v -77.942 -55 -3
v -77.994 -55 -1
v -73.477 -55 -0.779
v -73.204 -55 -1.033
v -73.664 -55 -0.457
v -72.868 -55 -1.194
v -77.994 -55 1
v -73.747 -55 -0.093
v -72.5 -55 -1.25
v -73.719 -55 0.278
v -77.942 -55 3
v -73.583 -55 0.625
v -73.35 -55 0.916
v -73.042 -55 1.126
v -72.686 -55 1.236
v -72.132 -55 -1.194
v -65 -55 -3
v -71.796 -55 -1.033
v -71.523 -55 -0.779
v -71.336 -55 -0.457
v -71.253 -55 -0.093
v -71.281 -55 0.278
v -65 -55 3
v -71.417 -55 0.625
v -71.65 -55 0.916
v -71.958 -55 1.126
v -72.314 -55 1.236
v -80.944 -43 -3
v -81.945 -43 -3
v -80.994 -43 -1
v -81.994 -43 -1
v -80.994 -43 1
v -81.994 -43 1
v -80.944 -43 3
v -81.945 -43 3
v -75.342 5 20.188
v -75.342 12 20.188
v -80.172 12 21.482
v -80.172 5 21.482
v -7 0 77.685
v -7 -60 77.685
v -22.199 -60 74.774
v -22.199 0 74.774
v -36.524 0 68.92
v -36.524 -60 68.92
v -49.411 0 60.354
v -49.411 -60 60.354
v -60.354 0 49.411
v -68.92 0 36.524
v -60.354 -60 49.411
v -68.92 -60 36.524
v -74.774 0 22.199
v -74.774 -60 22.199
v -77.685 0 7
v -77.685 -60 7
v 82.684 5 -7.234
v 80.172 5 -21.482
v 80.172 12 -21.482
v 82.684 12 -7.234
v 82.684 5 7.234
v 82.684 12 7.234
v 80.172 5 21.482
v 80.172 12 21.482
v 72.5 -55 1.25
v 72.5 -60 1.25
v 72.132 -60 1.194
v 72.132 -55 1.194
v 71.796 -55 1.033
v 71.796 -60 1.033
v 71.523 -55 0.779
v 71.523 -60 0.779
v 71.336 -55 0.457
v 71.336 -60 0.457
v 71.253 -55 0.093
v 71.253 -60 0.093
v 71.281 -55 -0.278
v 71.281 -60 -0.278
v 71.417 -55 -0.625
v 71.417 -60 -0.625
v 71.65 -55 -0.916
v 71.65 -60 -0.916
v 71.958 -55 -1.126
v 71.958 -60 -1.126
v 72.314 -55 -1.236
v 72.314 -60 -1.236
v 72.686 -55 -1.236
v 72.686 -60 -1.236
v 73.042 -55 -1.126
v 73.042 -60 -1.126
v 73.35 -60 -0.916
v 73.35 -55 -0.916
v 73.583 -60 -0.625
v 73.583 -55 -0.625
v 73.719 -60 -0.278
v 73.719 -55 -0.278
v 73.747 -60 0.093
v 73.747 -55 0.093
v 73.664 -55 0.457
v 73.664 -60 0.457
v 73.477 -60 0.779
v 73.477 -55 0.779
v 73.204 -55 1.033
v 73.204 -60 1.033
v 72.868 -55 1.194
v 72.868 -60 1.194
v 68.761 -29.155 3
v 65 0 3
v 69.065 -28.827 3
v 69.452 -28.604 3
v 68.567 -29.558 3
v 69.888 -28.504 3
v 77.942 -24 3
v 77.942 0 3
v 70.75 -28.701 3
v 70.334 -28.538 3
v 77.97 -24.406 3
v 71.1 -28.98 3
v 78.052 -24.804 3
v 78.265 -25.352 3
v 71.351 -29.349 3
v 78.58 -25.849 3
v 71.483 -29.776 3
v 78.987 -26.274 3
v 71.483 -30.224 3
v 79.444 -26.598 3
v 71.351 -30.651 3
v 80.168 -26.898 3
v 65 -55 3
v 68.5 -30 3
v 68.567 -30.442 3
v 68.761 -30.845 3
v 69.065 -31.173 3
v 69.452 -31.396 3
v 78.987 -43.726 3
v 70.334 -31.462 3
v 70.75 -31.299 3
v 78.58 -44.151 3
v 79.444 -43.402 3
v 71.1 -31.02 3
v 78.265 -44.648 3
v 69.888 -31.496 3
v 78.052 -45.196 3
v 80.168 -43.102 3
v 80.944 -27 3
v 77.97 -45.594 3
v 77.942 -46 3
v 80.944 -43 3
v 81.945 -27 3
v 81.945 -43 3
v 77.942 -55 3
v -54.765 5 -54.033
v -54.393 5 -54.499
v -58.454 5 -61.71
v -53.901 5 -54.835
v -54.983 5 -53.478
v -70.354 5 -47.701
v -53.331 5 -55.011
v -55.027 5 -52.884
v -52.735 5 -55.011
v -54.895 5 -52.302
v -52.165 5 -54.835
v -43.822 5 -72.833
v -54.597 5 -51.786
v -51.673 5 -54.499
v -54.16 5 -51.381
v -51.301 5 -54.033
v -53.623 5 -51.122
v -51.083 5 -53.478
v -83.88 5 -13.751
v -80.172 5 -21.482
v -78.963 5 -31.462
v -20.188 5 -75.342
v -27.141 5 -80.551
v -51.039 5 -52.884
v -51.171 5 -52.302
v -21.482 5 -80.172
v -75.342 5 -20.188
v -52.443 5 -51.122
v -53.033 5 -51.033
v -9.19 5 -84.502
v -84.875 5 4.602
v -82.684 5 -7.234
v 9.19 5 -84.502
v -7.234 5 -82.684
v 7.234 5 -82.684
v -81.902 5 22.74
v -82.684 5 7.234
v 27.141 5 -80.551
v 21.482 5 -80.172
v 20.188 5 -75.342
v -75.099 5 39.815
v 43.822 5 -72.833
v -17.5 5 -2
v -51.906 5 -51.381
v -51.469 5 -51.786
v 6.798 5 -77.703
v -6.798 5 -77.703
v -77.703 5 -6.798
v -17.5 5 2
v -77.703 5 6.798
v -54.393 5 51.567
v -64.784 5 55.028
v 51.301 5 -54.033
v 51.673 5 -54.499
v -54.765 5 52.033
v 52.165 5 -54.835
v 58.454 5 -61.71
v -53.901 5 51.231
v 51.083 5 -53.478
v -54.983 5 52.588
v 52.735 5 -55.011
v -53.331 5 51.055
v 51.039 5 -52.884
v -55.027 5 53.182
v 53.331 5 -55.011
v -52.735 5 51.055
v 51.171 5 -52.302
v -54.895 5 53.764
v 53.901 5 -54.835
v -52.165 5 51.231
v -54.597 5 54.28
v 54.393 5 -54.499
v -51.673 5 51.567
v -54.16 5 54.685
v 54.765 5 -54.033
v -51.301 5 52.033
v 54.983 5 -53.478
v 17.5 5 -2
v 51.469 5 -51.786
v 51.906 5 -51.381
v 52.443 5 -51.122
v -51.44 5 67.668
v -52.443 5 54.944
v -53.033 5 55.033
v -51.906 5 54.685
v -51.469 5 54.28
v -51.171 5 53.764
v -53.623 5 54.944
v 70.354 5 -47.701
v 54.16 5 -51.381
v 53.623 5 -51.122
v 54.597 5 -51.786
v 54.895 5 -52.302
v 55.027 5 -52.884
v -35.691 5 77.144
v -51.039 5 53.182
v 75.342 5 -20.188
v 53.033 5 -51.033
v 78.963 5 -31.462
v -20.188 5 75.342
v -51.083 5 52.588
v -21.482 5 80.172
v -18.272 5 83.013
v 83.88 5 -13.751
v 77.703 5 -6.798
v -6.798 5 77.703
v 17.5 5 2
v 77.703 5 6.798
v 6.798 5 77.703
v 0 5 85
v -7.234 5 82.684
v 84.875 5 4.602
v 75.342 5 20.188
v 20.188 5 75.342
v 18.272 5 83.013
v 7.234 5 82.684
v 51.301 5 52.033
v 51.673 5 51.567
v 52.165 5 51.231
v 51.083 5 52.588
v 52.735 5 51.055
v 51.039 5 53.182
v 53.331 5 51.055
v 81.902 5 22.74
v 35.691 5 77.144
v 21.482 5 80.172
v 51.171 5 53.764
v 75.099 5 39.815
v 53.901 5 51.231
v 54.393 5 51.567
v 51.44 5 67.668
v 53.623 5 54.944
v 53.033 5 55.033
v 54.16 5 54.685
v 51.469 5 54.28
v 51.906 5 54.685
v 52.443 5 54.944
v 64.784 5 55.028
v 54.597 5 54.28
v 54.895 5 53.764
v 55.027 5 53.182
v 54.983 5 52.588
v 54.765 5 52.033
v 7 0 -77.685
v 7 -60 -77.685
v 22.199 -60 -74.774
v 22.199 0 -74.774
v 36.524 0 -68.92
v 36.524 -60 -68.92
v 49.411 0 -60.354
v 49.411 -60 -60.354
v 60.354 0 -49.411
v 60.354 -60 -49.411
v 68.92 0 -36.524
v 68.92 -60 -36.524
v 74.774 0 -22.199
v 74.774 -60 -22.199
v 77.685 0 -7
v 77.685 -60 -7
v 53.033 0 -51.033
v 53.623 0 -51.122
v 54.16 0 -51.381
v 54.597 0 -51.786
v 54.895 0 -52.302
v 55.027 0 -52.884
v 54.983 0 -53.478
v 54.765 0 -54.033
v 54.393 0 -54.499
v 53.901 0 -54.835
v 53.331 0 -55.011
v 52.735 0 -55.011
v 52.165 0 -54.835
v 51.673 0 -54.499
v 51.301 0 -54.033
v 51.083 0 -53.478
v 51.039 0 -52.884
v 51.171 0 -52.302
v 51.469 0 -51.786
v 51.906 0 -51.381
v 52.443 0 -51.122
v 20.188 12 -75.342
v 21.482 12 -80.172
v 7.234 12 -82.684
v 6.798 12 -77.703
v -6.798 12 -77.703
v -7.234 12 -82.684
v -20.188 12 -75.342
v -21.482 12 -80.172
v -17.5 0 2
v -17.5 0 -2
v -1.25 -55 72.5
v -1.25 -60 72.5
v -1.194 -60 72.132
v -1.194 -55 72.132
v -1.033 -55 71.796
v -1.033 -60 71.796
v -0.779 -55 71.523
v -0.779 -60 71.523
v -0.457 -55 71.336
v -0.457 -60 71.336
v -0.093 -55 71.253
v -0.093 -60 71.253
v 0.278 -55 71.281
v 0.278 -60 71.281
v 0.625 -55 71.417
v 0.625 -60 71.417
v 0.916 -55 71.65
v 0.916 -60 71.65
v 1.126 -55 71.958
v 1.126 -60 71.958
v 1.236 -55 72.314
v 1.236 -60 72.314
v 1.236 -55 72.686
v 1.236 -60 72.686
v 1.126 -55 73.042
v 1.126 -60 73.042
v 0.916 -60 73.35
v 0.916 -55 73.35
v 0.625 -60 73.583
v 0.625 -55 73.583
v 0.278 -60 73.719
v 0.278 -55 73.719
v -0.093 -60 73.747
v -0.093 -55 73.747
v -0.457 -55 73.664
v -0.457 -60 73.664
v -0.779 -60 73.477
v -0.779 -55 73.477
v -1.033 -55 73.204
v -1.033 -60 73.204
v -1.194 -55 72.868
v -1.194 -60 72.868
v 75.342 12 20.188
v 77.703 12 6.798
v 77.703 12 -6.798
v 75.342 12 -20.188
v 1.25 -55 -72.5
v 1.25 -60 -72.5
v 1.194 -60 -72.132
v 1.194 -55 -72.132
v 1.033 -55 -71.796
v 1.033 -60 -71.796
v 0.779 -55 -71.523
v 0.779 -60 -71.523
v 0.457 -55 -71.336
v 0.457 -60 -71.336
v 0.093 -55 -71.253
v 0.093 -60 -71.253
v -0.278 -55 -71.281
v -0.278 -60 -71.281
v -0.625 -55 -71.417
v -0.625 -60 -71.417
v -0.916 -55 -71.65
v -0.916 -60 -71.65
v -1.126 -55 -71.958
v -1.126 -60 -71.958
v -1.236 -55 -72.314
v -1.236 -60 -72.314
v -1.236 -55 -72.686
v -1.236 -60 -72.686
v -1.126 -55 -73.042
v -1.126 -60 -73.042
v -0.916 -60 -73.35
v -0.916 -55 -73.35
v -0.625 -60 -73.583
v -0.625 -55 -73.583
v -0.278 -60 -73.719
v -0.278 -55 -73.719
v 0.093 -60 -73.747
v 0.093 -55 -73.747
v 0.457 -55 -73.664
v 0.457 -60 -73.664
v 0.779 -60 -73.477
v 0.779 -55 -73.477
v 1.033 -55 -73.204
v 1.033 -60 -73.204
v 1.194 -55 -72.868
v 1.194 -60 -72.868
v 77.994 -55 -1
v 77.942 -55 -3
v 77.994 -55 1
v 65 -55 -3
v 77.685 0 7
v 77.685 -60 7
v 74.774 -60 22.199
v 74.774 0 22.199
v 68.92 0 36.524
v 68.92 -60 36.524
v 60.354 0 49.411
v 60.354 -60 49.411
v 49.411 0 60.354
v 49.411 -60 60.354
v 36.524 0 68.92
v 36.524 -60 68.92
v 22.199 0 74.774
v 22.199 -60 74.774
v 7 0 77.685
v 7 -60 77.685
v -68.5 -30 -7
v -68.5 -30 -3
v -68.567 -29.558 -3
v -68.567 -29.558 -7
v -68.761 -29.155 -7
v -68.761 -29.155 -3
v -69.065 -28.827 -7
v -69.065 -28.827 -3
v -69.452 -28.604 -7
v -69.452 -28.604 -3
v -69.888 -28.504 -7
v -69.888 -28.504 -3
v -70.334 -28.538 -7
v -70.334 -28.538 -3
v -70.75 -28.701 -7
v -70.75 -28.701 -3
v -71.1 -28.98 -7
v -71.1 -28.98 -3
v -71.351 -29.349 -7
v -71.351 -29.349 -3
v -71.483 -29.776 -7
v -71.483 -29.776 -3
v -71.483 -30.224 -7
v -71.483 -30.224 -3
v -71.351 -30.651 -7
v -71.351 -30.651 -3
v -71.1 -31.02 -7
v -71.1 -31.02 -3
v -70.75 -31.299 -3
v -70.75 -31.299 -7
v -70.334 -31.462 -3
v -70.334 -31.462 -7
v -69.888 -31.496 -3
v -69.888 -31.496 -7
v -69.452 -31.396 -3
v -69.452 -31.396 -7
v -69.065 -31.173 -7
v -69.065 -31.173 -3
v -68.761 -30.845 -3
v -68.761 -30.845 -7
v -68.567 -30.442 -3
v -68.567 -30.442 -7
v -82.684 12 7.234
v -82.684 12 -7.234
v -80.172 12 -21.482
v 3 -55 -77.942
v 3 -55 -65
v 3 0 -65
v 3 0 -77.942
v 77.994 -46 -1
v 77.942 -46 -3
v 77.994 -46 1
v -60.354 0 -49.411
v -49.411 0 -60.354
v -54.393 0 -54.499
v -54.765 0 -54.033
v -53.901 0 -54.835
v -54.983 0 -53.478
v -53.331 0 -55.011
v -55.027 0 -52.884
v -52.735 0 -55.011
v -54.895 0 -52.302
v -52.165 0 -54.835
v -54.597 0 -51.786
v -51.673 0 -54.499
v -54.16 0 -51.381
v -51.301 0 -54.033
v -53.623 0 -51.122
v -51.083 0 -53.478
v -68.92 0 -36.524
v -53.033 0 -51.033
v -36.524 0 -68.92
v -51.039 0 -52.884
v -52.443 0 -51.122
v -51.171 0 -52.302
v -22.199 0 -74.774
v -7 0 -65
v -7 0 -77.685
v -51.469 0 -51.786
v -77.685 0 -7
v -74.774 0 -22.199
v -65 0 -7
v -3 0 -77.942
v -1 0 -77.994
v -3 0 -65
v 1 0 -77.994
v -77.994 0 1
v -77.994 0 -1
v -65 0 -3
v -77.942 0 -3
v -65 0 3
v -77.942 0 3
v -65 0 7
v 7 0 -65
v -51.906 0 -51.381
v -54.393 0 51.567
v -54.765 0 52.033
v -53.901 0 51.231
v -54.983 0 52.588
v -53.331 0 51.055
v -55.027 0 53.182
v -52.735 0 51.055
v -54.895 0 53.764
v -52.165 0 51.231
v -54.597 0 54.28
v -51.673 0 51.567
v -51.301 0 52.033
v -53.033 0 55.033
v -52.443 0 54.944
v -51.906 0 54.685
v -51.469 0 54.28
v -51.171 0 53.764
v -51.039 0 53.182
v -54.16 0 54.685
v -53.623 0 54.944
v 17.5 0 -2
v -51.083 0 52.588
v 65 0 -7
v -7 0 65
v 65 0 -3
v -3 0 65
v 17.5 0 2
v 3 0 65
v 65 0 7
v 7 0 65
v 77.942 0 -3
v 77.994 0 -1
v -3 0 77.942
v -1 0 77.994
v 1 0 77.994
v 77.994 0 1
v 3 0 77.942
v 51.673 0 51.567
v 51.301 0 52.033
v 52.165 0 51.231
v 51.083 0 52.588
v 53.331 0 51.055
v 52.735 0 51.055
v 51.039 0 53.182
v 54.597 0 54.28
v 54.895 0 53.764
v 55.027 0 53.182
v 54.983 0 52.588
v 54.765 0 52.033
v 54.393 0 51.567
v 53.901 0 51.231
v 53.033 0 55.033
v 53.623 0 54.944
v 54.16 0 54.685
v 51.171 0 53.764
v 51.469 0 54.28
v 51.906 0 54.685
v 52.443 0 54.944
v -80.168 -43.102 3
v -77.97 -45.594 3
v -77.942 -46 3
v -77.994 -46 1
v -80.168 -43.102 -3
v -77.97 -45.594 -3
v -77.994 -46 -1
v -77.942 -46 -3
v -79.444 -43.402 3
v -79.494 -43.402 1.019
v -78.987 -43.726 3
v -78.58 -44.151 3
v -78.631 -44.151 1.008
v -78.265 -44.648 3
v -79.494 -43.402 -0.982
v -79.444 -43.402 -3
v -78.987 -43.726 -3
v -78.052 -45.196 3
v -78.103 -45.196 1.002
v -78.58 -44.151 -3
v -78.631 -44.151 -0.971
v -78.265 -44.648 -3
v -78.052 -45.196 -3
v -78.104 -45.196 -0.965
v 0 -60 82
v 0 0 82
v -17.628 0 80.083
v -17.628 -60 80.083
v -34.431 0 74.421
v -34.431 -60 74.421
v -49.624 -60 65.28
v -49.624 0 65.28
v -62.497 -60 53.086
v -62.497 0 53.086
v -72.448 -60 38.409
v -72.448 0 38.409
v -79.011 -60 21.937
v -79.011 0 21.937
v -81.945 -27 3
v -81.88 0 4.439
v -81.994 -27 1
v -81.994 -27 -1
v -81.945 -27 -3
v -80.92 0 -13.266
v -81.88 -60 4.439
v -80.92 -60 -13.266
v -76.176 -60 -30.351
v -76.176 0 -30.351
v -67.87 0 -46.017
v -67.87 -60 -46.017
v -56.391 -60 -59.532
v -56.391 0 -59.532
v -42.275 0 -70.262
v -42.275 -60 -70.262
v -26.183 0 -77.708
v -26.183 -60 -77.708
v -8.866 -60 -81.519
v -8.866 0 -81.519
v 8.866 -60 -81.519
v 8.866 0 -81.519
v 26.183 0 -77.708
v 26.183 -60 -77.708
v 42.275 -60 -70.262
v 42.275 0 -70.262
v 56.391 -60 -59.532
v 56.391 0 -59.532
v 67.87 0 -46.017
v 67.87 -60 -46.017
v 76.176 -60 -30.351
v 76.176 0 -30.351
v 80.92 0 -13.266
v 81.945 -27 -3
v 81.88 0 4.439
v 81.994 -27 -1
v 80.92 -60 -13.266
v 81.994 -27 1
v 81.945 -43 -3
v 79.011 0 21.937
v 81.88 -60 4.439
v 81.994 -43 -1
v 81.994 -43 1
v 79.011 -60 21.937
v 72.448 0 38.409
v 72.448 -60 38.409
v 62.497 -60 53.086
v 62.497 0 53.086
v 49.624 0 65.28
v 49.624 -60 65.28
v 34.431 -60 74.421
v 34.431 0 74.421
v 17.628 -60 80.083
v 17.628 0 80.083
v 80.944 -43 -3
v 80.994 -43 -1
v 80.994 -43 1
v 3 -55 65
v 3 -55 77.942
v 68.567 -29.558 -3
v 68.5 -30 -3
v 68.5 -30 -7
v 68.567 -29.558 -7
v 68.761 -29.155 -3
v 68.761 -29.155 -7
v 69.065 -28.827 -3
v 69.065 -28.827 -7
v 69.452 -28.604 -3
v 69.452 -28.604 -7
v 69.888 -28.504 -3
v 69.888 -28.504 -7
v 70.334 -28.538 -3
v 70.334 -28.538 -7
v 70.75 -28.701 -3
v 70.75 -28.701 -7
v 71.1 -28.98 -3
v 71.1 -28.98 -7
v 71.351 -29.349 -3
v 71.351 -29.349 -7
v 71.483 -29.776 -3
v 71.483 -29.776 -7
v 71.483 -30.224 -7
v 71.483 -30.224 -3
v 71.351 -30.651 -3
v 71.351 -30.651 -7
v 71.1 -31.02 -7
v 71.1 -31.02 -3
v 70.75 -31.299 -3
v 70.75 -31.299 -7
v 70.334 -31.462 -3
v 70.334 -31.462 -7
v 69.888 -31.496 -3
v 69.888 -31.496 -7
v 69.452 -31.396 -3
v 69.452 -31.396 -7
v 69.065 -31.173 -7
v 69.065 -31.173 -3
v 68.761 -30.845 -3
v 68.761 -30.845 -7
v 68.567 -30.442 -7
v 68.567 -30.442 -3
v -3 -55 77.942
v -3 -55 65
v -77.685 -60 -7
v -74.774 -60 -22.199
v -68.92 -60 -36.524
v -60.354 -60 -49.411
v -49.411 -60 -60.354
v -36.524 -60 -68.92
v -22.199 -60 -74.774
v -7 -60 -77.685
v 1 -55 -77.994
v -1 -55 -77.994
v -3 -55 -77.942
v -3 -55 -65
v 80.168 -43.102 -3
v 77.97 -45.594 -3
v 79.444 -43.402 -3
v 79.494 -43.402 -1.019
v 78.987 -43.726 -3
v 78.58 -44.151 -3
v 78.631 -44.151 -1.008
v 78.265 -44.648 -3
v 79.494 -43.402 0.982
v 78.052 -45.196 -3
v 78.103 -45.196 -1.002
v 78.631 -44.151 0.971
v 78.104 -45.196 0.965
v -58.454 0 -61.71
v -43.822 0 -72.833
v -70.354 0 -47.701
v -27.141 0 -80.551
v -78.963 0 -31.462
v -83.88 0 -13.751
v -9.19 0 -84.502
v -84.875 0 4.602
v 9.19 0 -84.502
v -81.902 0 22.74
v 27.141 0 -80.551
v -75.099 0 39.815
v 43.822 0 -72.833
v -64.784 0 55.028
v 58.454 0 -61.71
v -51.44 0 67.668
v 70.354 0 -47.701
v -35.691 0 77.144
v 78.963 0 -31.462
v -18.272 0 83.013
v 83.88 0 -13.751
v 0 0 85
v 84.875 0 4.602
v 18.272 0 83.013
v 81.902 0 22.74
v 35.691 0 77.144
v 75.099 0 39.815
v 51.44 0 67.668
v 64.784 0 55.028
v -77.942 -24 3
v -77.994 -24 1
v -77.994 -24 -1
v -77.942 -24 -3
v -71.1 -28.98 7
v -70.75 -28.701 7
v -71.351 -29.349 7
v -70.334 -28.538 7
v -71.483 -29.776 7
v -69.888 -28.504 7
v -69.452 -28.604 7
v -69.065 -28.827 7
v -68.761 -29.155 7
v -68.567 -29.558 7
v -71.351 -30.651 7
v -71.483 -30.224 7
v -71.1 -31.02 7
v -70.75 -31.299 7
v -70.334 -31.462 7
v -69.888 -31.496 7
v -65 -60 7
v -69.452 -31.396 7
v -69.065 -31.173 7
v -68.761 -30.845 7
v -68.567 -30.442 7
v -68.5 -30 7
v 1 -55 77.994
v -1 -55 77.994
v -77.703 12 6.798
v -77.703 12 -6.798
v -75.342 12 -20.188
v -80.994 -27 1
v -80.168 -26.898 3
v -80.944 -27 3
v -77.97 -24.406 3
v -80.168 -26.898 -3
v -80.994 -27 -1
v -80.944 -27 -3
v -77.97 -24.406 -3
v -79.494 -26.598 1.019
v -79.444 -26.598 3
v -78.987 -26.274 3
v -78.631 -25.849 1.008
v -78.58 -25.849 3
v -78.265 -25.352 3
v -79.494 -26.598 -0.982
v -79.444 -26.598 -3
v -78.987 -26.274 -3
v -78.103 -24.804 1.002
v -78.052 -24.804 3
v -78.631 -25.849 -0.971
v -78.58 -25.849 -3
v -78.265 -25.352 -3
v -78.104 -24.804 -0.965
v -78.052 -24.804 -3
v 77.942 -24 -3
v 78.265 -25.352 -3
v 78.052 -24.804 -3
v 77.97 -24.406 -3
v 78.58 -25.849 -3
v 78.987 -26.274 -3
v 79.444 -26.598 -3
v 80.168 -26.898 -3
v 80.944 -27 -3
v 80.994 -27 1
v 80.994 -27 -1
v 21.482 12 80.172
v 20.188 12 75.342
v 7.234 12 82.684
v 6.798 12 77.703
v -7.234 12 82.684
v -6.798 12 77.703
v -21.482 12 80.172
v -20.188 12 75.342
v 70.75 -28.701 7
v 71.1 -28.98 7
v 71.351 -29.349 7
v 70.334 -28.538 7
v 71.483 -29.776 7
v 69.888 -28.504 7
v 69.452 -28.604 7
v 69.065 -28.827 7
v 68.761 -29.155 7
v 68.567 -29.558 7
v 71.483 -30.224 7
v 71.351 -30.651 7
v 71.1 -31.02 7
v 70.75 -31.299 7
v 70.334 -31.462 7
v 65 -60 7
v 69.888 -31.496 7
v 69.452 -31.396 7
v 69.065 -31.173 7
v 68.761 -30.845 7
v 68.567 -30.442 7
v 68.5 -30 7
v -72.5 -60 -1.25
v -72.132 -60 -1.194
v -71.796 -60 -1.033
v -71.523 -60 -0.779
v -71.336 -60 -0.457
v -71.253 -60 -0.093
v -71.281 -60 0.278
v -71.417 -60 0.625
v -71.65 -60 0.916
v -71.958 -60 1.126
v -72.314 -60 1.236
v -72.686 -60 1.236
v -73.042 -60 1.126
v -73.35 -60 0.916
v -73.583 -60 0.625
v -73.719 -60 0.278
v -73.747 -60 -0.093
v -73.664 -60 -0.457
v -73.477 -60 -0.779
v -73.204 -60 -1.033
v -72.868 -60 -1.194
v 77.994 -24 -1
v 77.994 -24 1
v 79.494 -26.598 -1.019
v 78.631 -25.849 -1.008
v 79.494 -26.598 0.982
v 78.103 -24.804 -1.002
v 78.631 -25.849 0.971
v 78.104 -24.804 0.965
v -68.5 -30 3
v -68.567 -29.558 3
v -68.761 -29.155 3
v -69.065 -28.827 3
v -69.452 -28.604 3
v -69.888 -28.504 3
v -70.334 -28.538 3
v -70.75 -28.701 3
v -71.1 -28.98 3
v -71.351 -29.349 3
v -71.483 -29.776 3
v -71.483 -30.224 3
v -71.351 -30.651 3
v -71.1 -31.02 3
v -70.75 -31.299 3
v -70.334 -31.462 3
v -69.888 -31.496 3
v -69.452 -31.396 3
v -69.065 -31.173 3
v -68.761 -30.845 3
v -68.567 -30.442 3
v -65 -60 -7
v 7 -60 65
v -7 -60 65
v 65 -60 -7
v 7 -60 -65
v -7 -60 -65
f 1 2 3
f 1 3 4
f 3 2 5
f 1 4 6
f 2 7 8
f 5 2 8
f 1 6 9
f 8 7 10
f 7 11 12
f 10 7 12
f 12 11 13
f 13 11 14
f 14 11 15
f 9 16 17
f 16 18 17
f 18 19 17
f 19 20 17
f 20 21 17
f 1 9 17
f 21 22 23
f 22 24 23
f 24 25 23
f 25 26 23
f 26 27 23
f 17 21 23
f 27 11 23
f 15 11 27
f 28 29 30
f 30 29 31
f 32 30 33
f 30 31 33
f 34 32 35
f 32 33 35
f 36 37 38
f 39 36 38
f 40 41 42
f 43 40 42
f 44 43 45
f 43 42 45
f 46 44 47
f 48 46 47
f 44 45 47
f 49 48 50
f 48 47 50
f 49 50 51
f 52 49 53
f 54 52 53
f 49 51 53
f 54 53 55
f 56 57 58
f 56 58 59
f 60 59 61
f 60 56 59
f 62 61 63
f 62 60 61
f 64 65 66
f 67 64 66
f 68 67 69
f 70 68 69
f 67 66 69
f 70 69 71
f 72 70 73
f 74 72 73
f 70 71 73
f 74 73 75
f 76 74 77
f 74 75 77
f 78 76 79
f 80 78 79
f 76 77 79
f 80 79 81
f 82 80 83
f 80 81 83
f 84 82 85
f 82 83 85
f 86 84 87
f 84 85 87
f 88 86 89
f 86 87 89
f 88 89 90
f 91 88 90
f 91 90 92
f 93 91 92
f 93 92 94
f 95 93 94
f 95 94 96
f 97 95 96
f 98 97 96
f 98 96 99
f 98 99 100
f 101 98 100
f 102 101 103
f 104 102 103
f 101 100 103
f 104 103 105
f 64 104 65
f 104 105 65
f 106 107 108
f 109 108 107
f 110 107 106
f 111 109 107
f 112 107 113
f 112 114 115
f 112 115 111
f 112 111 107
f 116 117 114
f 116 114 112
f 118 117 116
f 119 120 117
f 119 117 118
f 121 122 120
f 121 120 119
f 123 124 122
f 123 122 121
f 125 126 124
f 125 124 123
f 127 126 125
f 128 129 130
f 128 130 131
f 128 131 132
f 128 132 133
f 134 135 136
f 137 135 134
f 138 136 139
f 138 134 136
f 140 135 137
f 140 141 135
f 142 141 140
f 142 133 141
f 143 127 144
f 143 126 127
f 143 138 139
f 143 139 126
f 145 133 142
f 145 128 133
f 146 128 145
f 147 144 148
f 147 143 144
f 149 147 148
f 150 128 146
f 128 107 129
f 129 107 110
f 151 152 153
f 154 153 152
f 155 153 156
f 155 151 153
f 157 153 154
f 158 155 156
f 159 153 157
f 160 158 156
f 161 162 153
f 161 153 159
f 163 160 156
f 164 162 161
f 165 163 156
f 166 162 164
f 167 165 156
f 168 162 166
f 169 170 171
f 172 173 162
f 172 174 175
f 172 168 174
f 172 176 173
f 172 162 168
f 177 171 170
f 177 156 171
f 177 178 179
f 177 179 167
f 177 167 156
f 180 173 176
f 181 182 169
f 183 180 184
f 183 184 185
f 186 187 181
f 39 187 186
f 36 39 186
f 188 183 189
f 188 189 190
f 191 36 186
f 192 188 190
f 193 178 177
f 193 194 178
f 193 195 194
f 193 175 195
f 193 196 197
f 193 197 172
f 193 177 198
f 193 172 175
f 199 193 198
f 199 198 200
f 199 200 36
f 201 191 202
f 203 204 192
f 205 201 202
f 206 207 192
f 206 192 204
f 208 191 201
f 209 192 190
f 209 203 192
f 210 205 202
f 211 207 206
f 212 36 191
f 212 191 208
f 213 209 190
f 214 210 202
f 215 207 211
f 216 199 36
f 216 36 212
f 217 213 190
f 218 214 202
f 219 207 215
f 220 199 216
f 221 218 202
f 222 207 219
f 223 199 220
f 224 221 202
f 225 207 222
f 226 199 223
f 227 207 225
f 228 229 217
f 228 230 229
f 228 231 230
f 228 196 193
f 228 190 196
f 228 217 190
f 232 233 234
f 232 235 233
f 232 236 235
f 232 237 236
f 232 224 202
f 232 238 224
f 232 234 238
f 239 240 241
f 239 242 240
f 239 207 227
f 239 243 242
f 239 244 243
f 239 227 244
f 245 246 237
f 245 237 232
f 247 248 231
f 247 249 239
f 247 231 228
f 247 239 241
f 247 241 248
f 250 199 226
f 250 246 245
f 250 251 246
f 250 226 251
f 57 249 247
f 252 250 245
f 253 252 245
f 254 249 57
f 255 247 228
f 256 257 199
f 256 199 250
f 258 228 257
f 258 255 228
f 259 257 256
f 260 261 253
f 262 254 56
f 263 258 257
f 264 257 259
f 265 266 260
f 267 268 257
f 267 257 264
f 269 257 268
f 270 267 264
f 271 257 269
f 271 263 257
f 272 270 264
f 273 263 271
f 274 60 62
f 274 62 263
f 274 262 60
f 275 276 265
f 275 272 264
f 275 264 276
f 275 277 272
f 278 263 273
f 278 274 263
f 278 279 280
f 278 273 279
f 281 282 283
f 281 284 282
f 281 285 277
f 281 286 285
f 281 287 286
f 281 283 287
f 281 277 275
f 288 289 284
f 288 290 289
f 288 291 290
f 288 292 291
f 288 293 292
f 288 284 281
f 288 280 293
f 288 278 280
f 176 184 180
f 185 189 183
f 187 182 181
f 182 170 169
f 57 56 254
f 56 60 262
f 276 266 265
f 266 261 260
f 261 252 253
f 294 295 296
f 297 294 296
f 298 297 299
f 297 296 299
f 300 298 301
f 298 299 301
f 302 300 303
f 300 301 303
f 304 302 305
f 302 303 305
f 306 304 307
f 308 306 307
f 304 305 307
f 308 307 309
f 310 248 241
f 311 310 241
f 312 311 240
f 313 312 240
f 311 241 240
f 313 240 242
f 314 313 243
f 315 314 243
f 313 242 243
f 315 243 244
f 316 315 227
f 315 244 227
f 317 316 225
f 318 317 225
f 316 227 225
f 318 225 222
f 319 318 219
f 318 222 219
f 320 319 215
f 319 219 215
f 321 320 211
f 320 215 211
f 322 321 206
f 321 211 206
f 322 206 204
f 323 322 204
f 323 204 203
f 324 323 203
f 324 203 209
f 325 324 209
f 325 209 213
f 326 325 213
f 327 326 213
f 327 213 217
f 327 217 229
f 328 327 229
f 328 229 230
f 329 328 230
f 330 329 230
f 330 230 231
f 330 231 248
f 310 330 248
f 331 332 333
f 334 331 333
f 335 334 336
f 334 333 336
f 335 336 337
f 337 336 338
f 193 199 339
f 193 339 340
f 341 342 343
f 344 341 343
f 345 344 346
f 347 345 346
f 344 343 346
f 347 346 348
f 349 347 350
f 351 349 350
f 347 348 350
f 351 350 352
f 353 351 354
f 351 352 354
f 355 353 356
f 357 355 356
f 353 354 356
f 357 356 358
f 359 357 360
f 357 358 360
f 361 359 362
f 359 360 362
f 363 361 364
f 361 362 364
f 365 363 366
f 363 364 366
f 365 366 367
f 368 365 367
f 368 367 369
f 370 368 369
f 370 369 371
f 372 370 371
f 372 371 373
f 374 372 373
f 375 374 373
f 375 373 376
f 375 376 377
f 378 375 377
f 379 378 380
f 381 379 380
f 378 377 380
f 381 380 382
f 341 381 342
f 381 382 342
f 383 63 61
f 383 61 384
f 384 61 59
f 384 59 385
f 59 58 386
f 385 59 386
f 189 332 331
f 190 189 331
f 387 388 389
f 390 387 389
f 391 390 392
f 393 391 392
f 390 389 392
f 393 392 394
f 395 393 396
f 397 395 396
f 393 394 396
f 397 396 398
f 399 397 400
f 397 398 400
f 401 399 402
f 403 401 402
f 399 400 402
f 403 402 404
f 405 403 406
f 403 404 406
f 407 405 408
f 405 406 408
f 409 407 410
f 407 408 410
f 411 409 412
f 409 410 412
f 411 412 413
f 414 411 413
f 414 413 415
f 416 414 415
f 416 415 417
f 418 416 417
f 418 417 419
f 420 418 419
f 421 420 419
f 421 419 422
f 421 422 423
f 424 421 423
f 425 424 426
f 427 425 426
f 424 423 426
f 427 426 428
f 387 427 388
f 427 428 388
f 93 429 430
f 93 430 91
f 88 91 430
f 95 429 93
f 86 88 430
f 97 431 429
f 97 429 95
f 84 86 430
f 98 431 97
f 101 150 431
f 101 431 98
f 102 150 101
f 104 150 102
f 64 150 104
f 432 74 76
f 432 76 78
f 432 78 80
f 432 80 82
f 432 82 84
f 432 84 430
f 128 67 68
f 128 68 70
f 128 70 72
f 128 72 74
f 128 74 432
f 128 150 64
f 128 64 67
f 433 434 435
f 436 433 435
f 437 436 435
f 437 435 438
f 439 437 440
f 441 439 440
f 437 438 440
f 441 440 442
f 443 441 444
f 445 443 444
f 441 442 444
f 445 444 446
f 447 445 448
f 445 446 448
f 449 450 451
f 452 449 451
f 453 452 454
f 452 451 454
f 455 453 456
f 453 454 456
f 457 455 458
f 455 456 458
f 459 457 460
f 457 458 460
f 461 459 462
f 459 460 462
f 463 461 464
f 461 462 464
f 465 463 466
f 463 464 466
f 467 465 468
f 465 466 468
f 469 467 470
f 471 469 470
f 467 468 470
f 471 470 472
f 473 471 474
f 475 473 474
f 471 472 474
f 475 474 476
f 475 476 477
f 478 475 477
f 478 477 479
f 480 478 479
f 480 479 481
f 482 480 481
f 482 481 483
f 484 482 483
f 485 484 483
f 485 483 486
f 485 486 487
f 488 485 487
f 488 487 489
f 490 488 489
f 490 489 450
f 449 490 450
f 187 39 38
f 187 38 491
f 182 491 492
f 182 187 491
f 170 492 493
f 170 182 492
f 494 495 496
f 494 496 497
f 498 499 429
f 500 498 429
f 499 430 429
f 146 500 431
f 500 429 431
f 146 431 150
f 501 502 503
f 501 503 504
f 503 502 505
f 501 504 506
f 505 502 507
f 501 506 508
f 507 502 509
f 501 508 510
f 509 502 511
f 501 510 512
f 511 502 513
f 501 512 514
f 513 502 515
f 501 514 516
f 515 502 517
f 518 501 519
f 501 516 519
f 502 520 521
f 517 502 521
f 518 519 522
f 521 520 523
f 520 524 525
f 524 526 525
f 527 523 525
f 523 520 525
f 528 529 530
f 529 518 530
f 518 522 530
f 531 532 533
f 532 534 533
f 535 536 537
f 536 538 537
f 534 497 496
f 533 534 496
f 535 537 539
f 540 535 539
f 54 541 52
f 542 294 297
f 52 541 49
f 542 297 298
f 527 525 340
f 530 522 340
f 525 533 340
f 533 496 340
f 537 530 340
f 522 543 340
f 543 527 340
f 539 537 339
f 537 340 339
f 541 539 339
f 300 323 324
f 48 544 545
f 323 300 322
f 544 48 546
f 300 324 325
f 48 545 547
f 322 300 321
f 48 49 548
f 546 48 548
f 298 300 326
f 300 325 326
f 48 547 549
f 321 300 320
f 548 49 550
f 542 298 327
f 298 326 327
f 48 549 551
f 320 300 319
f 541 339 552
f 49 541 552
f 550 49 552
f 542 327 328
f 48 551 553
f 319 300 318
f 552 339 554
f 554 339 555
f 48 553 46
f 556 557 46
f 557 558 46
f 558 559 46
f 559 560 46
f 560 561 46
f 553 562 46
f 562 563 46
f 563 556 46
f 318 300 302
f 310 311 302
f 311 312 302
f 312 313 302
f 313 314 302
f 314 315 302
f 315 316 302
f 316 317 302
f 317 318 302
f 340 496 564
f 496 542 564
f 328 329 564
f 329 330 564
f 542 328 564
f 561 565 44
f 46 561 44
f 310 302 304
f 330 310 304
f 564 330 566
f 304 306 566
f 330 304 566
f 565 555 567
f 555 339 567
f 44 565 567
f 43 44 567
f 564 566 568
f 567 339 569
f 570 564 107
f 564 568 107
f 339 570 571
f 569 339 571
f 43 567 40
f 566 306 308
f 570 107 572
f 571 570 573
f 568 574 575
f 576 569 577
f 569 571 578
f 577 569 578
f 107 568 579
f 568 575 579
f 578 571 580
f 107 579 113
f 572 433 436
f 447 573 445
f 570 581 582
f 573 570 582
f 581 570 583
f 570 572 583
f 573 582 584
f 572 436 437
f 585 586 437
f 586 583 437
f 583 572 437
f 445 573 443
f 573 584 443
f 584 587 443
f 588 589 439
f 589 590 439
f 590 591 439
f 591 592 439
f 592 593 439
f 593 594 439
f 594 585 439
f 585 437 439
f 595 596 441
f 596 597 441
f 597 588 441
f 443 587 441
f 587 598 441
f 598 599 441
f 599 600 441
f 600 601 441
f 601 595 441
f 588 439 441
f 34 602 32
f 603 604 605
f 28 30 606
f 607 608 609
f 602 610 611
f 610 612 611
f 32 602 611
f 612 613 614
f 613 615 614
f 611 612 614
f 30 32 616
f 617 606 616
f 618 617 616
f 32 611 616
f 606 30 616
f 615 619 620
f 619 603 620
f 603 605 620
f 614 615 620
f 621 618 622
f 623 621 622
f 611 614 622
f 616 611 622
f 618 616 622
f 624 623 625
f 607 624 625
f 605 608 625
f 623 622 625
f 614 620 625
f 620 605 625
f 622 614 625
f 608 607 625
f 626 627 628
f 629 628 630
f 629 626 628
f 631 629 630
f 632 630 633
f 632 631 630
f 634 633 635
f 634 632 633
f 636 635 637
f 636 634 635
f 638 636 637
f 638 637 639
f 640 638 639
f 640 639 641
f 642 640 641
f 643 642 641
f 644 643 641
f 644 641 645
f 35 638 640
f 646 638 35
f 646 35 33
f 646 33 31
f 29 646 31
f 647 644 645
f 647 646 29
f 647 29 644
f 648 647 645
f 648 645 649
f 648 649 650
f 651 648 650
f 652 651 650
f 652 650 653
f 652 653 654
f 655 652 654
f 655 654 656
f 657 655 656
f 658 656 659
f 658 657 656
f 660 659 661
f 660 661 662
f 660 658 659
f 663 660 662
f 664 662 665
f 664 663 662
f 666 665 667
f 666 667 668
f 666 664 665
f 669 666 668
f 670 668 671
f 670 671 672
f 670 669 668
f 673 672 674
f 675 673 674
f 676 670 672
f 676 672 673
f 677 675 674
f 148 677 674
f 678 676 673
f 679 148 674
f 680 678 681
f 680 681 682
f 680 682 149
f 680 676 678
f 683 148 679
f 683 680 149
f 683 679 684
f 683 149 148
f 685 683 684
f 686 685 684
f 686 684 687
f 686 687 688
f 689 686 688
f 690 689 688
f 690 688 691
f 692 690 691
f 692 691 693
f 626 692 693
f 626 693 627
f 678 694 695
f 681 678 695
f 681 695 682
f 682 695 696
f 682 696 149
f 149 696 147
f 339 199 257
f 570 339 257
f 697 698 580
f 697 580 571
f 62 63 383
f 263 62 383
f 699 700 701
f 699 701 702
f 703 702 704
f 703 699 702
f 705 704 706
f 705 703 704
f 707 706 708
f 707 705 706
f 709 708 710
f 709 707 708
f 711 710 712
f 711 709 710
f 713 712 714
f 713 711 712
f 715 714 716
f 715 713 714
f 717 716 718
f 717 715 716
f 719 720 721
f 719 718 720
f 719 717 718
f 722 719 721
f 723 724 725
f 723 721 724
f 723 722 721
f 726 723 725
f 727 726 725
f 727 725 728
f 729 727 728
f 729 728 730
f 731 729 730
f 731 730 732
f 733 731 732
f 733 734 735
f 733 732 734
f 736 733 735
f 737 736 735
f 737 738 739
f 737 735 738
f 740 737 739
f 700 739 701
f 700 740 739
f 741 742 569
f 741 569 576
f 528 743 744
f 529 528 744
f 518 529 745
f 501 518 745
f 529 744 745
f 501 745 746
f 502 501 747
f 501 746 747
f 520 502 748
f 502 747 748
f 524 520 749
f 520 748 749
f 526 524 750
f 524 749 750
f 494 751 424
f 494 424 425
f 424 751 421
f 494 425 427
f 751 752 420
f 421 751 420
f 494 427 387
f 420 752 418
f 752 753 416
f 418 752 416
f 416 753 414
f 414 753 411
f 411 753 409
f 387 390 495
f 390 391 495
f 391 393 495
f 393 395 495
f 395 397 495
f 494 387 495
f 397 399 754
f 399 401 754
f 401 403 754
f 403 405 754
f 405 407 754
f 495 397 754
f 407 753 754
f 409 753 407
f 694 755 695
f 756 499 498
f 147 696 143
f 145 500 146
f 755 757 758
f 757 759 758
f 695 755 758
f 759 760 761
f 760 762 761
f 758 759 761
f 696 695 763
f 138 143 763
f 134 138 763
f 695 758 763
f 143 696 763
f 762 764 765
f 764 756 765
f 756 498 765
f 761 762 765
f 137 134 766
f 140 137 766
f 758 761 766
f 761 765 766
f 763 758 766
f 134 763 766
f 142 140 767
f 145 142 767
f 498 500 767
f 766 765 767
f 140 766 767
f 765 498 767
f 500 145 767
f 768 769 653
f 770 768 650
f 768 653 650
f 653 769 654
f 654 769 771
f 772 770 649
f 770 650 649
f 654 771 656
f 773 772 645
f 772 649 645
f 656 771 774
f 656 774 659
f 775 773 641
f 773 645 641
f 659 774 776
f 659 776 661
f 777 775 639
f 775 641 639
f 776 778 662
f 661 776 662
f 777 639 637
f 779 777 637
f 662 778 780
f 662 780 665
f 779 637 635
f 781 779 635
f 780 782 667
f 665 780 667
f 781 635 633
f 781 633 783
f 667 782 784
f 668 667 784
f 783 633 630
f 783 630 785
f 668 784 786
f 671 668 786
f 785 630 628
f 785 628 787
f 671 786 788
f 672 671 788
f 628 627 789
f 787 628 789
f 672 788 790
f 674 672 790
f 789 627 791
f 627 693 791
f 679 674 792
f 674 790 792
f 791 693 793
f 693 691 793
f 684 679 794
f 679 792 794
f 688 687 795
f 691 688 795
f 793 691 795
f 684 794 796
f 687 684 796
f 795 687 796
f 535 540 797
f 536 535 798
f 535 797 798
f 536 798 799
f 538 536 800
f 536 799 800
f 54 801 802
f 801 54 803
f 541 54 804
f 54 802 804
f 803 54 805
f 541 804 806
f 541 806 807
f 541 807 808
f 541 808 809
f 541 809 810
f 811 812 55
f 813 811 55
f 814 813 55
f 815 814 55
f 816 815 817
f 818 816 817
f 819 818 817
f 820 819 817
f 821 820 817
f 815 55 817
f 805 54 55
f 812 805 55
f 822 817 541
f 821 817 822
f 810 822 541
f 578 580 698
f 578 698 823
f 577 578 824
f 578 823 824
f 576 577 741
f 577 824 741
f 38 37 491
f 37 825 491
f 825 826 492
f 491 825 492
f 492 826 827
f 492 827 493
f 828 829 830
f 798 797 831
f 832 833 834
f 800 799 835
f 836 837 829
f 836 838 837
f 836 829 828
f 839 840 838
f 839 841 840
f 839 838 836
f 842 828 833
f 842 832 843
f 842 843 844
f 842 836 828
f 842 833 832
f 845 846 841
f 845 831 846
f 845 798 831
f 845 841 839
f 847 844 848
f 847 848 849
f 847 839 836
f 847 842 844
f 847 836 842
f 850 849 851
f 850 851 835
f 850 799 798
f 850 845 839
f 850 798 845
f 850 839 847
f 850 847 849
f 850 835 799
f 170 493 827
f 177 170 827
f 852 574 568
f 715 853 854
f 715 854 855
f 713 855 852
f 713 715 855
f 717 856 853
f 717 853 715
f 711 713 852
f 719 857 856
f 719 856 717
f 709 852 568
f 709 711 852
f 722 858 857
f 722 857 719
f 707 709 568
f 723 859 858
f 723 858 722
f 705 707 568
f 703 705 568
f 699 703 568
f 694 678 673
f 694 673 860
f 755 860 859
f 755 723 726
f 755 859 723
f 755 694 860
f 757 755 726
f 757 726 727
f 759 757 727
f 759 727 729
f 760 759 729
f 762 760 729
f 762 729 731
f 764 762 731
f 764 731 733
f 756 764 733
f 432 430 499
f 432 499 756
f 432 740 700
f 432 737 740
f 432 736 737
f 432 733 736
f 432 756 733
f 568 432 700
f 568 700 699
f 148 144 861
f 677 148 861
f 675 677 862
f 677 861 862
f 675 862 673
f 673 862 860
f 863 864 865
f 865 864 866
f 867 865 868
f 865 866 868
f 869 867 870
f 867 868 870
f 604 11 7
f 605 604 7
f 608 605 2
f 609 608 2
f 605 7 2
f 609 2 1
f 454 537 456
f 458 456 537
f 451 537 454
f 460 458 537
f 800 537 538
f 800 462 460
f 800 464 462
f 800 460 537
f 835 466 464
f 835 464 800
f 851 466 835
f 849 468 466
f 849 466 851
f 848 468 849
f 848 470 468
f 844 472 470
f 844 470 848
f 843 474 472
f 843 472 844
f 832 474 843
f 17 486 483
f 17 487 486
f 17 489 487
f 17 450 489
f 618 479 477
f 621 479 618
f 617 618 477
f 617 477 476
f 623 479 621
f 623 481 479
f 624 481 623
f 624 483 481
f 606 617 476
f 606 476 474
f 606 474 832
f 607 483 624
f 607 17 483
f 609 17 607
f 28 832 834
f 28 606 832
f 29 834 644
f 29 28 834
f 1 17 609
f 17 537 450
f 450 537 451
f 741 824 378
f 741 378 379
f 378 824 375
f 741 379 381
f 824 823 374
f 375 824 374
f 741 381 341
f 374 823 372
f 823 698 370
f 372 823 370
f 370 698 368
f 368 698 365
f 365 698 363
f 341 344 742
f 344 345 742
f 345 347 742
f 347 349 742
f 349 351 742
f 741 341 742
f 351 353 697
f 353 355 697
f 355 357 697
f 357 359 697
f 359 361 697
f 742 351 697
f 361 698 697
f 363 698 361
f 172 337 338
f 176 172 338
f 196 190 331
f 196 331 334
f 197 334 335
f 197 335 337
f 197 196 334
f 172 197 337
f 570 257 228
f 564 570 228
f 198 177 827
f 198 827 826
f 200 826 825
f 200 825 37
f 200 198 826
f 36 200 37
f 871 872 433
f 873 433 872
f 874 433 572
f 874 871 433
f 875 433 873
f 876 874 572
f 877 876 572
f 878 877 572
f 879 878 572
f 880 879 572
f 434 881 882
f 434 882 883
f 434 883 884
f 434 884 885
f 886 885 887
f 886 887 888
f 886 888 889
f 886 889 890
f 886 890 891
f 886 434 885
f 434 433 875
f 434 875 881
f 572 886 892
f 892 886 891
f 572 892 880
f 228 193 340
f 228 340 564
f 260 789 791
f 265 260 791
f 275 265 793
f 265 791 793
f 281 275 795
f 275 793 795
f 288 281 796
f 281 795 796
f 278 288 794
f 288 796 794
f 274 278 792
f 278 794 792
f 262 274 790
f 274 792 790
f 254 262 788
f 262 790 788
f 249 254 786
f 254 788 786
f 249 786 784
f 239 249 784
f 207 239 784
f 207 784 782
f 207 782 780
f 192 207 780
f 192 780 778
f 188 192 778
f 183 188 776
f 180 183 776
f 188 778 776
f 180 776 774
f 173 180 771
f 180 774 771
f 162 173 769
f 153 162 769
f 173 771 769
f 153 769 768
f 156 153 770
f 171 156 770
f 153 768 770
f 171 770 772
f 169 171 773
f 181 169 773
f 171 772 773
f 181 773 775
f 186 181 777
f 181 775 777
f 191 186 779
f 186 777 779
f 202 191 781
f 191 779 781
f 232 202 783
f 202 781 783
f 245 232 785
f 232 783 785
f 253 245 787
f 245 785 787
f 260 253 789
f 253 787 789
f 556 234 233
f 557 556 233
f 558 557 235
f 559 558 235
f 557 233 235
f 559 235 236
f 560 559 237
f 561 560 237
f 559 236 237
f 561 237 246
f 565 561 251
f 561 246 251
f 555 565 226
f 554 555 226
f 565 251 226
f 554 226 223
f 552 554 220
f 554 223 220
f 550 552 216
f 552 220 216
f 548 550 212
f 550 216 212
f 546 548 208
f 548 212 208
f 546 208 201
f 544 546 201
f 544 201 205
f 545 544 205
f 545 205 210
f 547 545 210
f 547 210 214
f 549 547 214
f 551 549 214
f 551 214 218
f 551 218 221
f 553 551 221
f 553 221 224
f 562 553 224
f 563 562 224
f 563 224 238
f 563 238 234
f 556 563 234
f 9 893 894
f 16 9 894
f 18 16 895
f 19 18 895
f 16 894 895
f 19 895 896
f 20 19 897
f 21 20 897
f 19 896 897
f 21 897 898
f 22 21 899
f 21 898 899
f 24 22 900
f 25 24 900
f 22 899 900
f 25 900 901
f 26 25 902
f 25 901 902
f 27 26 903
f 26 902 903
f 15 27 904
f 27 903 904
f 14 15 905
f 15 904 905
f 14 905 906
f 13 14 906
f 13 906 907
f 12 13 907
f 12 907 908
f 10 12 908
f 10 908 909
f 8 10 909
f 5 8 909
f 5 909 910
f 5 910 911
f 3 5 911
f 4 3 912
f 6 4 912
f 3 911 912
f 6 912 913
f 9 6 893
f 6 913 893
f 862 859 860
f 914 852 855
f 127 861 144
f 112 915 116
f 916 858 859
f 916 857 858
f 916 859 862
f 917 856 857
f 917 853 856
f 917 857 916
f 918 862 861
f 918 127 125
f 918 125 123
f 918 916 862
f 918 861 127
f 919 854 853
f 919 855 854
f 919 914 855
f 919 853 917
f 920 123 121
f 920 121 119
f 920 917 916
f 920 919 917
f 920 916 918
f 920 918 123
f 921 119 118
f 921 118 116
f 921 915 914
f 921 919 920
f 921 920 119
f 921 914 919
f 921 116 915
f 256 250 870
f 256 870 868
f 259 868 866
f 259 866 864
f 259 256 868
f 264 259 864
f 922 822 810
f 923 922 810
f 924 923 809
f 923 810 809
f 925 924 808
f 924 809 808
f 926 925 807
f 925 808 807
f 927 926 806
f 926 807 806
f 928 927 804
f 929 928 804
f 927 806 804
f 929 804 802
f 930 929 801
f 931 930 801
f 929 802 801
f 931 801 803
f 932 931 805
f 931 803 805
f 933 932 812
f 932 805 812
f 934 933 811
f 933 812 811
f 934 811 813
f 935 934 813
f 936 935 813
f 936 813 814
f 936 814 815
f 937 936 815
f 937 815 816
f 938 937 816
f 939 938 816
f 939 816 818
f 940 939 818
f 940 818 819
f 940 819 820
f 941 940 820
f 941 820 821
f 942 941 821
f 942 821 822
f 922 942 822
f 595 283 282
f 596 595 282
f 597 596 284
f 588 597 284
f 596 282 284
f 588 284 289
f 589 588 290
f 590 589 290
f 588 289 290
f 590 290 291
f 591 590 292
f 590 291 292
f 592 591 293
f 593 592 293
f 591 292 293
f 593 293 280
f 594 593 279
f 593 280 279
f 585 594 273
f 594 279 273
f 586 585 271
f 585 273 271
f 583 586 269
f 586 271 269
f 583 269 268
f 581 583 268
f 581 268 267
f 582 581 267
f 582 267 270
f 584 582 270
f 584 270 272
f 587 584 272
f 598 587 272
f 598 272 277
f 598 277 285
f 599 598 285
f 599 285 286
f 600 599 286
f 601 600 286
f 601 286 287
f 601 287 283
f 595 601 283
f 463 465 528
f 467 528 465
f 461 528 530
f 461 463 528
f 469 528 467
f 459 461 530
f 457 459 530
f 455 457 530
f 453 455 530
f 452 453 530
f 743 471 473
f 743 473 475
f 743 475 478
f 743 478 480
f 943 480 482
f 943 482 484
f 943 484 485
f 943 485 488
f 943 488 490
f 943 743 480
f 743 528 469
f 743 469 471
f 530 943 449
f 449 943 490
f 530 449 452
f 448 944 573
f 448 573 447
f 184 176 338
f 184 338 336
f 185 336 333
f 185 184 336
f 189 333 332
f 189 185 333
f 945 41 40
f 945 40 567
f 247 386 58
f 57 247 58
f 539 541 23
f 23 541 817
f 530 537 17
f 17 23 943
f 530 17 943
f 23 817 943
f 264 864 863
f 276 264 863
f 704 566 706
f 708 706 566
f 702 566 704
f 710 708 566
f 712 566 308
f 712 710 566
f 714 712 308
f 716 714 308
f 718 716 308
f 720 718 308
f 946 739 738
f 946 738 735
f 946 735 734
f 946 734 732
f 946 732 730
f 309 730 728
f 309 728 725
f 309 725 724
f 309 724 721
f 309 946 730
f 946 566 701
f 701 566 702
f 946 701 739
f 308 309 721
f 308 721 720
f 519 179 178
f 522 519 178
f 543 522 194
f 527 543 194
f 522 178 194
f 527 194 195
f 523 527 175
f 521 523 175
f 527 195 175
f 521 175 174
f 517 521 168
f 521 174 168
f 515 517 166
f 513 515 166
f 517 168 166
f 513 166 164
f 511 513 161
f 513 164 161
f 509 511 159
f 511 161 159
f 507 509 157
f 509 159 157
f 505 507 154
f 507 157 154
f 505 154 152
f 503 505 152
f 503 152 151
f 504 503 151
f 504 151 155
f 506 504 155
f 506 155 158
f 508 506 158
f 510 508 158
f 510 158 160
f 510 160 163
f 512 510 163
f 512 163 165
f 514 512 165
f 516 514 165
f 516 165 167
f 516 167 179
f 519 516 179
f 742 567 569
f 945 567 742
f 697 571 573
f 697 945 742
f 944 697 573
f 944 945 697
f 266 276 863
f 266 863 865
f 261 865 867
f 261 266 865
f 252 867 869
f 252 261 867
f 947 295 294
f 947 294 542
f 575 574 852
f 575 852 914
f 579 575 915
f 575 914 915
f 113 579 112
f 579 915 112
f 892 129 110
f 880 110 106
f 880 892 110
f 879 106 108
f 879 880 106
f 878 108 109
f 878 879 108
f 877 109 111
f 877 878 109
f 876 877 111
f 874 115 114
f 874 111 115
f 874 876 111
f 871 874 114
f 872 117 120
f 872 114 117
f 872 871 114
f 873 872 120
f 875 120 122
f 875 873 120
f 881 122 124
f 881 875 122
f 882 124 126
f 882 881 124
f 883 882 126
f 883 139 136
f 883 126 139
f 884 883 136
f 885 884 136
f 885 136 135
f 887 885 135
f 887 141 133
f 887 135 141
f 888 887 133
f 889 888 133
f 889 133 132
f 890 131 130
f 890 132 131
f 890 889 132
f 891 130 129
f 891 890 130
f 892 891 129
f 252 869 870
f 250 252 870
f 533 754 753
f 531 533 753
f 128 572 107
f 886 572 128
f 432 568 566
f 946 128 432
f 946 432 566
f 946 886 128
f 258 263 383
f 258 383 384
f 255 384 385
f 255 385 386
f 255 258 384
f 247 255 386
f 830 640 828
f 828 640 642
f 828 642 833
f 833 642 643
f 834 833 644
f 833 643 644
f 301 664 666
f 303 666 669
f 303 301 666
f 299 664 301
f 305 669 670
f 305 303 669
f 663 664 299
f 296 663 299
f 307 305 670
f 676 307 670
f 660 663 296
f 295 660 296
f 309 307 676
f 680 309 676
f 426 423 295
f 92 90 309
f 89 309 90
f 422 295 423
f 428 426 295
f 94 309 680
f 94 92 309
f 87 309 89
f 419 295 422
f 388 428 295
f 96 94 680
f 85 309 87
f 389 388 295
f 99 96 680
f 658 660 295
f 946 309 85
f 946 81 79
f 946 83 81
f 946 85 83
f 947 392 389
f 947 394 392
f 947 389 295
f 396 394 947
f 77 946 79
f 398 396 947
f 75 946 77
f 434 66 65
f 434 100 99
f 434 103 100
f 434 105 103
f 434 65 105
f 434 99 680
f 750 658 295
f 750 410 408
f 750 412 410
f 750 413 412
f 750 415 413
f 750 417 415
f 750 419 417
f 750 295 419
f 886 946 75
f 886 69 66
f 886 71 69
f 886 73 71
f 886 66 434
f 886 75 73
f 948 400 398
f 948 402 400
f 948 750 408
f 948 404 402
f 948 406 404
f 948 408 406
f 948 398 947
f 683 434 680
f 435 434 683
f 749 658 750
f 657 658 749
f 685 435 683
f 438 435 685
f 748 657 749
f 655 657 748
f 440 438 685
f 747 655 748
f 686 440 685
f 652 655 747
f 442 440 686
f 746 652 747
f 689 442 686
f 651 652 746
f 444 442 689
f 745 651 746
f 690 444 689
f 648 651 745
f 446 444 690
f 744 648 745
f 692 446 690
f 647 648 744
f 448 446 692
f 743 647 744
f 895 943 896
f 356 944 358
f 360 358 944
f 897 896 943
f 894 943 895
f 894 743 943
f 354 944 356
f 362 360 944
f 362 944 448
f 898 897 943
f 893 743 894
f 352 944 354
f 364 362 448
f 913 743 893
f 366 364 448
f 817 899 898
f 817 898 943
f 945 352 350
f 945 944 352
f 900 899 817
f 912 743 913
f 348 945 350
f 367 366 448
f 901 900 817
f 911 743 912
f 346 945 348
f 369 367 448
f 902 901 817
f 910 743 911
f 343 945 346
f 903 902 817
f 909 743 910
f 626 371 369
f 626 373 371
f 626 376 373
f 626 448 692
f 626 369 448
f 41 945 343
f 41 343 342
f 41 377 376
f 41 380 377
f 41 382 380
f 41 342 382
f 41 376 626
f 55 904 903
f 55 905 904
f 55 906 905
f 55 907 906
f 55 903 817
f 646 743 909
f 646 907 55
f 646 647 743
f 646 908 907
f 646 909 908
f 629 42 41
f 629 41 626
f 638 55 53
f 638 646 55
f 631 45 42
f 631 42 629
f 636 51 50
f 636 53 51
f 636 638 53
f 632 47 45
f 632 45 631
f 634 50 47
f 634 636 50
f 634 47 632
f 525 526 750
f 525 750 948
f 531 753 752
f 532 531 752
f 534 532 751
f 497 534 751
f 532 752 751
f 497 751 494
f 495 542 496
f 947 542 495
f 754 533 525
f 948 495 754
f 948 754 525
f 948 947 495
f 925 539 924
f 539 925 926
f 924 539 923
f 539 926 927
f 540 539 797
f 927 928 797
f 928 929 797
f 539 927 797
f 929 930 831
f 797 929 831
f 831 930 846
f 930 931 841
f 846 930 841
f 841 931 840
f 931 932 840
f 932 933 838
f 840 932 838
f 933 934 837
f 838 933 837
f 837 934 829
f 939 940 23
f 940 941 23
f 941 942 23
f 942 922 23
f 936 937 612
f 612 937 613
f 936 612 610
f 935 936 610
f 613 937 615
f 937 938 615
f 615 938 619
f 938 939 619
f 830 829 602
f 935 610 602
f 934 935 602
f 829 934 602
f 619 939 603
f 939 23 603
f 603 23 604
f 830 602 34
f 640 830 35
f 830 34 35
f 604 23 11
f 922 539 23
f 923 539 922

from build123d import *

# Parameters (mm, degrees)
SKETCH1_R                   = 85
BOSS_EXTRUDE1_DEPTH         = 5
SKETCH14_R                  = 2
CUT_EXTRUDE2_DEPTH          = 133
SKETCH16_W                  = 35
SKETCH16_H                  = 4
CUT_EXTRUDE4_DEPTH          = 10
BOSS_EXTRUDE2_DEPTH         = 7
BOSS_EXTRUDE3_START         = 60
SKETCH20_R                  = 82
SKETCH20_R_2                = 78
BOSS_EXTRUDE3_DEPTH         = 60
BOSS_EXTRUDE4_START         = 60
BOSS_EXTRUDE4_DEPTH         = 60
SKETCH23_R                  = 1.5
CUT_EXTRUDE5_DEPTH          = 25
CUT_EXTRUDE6_DEPTH          = 110
CUT_EXTRUDE6_DEPTH_BACK     = 105
FILLET1_R                   = 3
SKETCH27_W                  = 14
SKETCH27_H                  = 14
BOSS_EXTRUDE5_DEPTH         = 5
CIRPATTERN1_COUNT           = 2
CIRPATTERN1_ANGLE           = 90
CIRPATTERN1_COPY_1_SKETCH_W = 14
CIRPATTERN1_COPY_1_SKETCH_H = 14
CIRPATTERN1_COPY_1_DEPTH    = 5
SKETCH29_R                  = 1.25
CUT_EXTRUDE7_DEPTH          = 5
CIRPATTERN2_COUNT           = 4


with BuildPart() as part:
    # Sketch1 → Boss-Extrude1 (new body)
    with BuildSketch(Plane(origin=(0, 0, 0), x_dir=(1, 0, 0), z_dir=(0, 1, 0))):
        with Locations(Location((0, 0, 0), (0, 0, 270))):
            Circle(SKETCH1_R)
    extrude(amount=BOSS_EXTRUDE1_DEPTH)

    # Sketch14 → Cut-Extrude2 (cut)
    with BuildSketch(Plane(origin=(0, 5, 0), x_dir=(1, 0, 0), z_dir=(0, 1, 0))):
        with Locations(Location((-53.033008589, 53.033008589, 0), (0, 0, 270))):
            Circle(SKETCH14_R)
        with Locations(Location((53.033008589, 53.033008589, 0), (0, 0, 270))):
            Circle(SKETCH14_R)
        with Locations(Location((53.033008589, -53.033008589, 0), (0, 0, 270))):
            Circle(SKETCH14_R)
        with Locations(Location((-53.033008589, -53.033008589, 0), (0, 0, 270))):
            Circle(SKETCH14_R)
    extrude(amount=-CUT_EXTRUDE2_DEPTH, mode=Mode.SUBTRACT)

    # Sketch16 → Cut-Extrude4 (cut)
    with BuildSketch(Plane(origin=(0, 5, 0), x_dir=(1, 0, 0), z_dir=(0, 1, 0))):
        Rectangle(SKETCH16_W, SKETCH16_H)
    extrude(amount=-CUT_EXTRUDE4_DEPTH, mode=Mode.SUBTRACT)

    # Sketch19 → Boss-Extrude2 (add)
    with BuildSketch(Plane(origin=(0, 5, 0), x_dir=(1, 0, 0), z_dir=(0, 1, 0))):
        with BuildLine():
            Line((75.342214451, 20.187885518), (80.171843582, 21.481980744))
            ThreePointArc((80.171843582, 21.481980744), (83, 0), (80.171843582, -21.481980744))
            Line((80.171843582, -21.481980744), (75.342214451, -20.187885518))
            ThreePointArc((75.342214451, -20.187885518), (78, 0), (75.342214451, 20.187885518))
        make_face()
        with BuildLine():
            Line((20.187885518, -75.342214451), (21.481980744, -80.171843582))
            ThreePointArc((21.481980744, -80.171843582), (0, -83), (-21.481980744, -80.171843582))
            Line((-21.481980744, -80.171843582), (-20.187885518, -75.342214451))
            ThreePointArc((-20.187885518, -75.342214451), (0, -78), (20.187885518, -75.342214451))
        make_face()
        with BuildLine():
            Line((-75.342214451, -20.187885518), (-80.171843582, -21.481980744))
            ThreePointArc((-80.171843582, -21.481980744), (-83, 0), (-80.171843582, 21.481980744))
            Line((-80.171843582, 21.481980744), (-75.342214451, 20.187885518))
            ThreePointArc((-75.342214451, 20.187885518), (-78, 0), (-75.342214451, -20.187885518))
        make_face()
        with BuildLine():
            Line((-20.187885518, 75.342214451), (-21.481980744, 80.171843582))
            ThreePointArc((-21.481980744, 80.171843582), (0, 83), (21.481980744, 80.171843582))
            Line((21.481980744, 80.171843582), (20.187885518, 75.342214451))
            ThreePointArc((20.187885518, 75.342214451), (0, 78), (-20.187885518, 75.342214451))
        make_face()
    extrude(amount=BOSS_EXTRUDE2_DEPTH)

    # Sketch20 → Boss-Extrude3 (add)
    with BuildSketch(Plane.XZ.offset(BOSS_EXTRUDE3_START)):
        with Locations(Location((0, 0, 0), (0, 0, 90))):
            Circle(SKETCH20_R)
        with Locations(Location((0, 0, 0), (0, 0, 270))):
            Circle(SKETCH20_R_2, mode=Mode.SUBTRACT)
    extrude(amount=-BOSS_EXTRUDE3_DEPTH)

    # Sketch22 → Boss-Extrude4 (add)
    with BuildSketch(Plane.XZ.offset(BOSS_EXTRUDE4_START)):
        with BuildLine():
            Line((-65, -7), (-65, -3))
            Line((-65, -3), (-77.942286341, -3))
            ThreePointArc((-77.942286341, -3), (-77.839472536, -5.00165126), (-77.685262438, -7))
            Line((-77.685262438, -7), (-65, -7))
        make_face()
        with BuildLine():
            ThreePointArc((-77.685262438, -7), (-77.839472536, -5.00165126), (-77.942286341, -3))
            Line((-77.942286341, -3), (-80.944425379, -3))
            ThreePointArc((-80.944425379, -3), (-80.845437043, -5.001530694), (-80.696964007, -7))
            Line((-80.696964007, -7), (-77.685262438, -7))
        make_face()
        with BuildLine():
            ThreePointArc((77.685262438, 7), (77.839472536, 5.00165126), (77.942286341, 3))
            Line((77.942286341, 3), (80.944425379, 3))
            ThreePointArc((80.944425379, 3), (80.845437043, 5.001530694), (80.696964007, 7))
            Line((80.696964007, 7), (77.685262438, 7))
        make_face()
        with BuildLine():
            Line((65, 3), (77.942286341, 3))
            ThreePointArc((77.942286341, 3), (77.839472536, 5.00165126), (77.685262438, 7))
            Line((77.685262438, 7), (65, 7))
            Line((65, 7), (65, 3))
        make_face()
        with BuildLine():
            Line((77.942286341, -3), (65, -3))
            Line((65, -3), (65, -7))
            Line((65, -7), (77.685262438, -7))
            ThreePointArc((77.685262438, -7), (77.839472536, -5.00165126), (77.942286341, -3))
        make_face()
        with BuildLine():
            Line((80.944425379, -3), (77.942286341, -3))
            ThreePointArc((77.942286341, -3), (77.839472536, -5.00165126), (77.685262438, -7))
            Line((77.685262438, -7), (80.696964007, -7))
            ThreePointArc((80.696964007, -7), (80.845437043, -5.001530694), (80.944425379, -3))
        make_face()
        with BuildLine():
            Line((-80.696964007, 7), (-65, 7))
            Line((-65, 7), (-65, 3))
            Line((-65, 3), (-80.944425379, 3))
            ThreePointArc((-80.944425379, 3), (-80.845437043, 5.001530694), (-80.696964007, 7))
        make_face()
    boss_extrude4 = extrude(amount=-BOSS_EXTRUDE4_DEPTH)

    # Sketch23 → Cut-Extrude5 (cut)
    with BuildSketch(Plane.XY.offset(7)):
        with Locations((-70, -30)):
            Circle(SKETCH23_R)
    cut_extrude5 = extrude(amount=-CUT_EXTRUDE5_DEPTH, mode=Mode.SUBTRACT)

    # Mirror1: Cut-Extrude5 across plane
    add(cut_extrude5.mirror(Plane(origin=(0, 0, 0), x_dir=(0, 0, 1), z_dir=(1, 0, 0))), mode=Mode.SUBTRACT)

    # Sketch25 → Cut-Extrude6 (cut, two sides: drawn at the far end of the back side and taken through both)
    with BuildSketch(Plane(origin=(0, 0, 0), x_dir=(0, 0, -1), z_dir=(1, 0, 0)).offset(-CUT_EXTRUDE6_DEPTH_BACK)):
        Polygon((-3, -27), (3, -27), (3, -33), (3, -43), (-3, -43), (-3, -33), align=None)
    extrude(amount=CUT_EXTRUDE6_DEPTH + CUT_EXTRUDE6_DEPTH_BACK, mode=Mode.SUBTRACT)

    # Fillet1
    fillet1_edges = [part.edges().sort_by_distance(p)[0] for p in [
        (-78, -27, 0),
        (78, -27, 0),
        (-78, -43, 0),
        (78, -43, 0),
    ]]
    fillet(fillet1_edges, radius=FILLET1_R)

    # Sketch27 → Boss-Extrude5 (add)
    with BuildSketch(Plane.XZ.offset(60)):
        with Locations((-72, 0)):
            Rectangle(SKETCH27_W, SKETCH27_H)
    boss_extrude5 = extrude(amount=-BOSS_EXTRUDE5_DEPTH)

    # Mirror2: Boss-Extrude5 across plane
    add(boss_extrude5.mirror(Plane(origin=(0, 0, 0), x_dir=(0, 0, 1), z_dir=(1, 0, 0))))

    # CirPattern1: Boss-Extrude4, Boss-Extrude5 ×2 about axis
    cirpattern1_axis = Axis((0, 0, 0), (0, -1, 0))
    add([boss_extrude4.rotate(cirpattern1_axis, i * CIRPATTERN1_ANGLE / (CIRPATTERN1_COUNT - 1)) for i in range(1, CIRPATTERN1_COUNT)])
    add([boss_extrude5.rotate(cirpattern1_axis, i * CIRPATTERN1_ANGLE / (CIRPATTERN1_COUNT - 1)) for i in range(1, CIRPATTERN1_COUNT)])

    # CirPattern1 copy 1 sketch → CirPattern1 copy 1 (add)
    with BuildSketch(Plane(origin=(0, -60, 0), x_dir=(0, 0, -1), z_dir=(0, -1, 0))):
        with Locations((-72, 0)):
            Rectangle(CIRPATTERN1_COPY_1_SKETCH_W, CIRPATTERN1_COPY_1_SKETCH_H)
    extrude(amount=-CIRPATTERN1_COPY_1_DEPTH)

    # Sketch29 → Cut-Extrude7 (cut)
    with BuildSketch(Plane.XZ.offset(60)):
        with Locations(Location((-72.5, 0, 0), (0, 0, 270))):
            Circle(SKETCH29_R)
    cut_extrude7 = extrude(amount=-CUT_EXTRUDE7_DEPTH, mode=Mode.SUBTRACT)

    # CirPattern2: Cut-Extrude7 ×4 about axis
    cirpattern2_axis = Axis((0, 0, 0), (0, 1, 0))
    for i in range(1, CIRPATTERN2_COUNT):
        add(cut_extrude7.rotate(cirpattern2_axis, i * 360 / CIRPATTERN2_COUNT), mode=Mode.SUBTRACT)


solid = part.part
